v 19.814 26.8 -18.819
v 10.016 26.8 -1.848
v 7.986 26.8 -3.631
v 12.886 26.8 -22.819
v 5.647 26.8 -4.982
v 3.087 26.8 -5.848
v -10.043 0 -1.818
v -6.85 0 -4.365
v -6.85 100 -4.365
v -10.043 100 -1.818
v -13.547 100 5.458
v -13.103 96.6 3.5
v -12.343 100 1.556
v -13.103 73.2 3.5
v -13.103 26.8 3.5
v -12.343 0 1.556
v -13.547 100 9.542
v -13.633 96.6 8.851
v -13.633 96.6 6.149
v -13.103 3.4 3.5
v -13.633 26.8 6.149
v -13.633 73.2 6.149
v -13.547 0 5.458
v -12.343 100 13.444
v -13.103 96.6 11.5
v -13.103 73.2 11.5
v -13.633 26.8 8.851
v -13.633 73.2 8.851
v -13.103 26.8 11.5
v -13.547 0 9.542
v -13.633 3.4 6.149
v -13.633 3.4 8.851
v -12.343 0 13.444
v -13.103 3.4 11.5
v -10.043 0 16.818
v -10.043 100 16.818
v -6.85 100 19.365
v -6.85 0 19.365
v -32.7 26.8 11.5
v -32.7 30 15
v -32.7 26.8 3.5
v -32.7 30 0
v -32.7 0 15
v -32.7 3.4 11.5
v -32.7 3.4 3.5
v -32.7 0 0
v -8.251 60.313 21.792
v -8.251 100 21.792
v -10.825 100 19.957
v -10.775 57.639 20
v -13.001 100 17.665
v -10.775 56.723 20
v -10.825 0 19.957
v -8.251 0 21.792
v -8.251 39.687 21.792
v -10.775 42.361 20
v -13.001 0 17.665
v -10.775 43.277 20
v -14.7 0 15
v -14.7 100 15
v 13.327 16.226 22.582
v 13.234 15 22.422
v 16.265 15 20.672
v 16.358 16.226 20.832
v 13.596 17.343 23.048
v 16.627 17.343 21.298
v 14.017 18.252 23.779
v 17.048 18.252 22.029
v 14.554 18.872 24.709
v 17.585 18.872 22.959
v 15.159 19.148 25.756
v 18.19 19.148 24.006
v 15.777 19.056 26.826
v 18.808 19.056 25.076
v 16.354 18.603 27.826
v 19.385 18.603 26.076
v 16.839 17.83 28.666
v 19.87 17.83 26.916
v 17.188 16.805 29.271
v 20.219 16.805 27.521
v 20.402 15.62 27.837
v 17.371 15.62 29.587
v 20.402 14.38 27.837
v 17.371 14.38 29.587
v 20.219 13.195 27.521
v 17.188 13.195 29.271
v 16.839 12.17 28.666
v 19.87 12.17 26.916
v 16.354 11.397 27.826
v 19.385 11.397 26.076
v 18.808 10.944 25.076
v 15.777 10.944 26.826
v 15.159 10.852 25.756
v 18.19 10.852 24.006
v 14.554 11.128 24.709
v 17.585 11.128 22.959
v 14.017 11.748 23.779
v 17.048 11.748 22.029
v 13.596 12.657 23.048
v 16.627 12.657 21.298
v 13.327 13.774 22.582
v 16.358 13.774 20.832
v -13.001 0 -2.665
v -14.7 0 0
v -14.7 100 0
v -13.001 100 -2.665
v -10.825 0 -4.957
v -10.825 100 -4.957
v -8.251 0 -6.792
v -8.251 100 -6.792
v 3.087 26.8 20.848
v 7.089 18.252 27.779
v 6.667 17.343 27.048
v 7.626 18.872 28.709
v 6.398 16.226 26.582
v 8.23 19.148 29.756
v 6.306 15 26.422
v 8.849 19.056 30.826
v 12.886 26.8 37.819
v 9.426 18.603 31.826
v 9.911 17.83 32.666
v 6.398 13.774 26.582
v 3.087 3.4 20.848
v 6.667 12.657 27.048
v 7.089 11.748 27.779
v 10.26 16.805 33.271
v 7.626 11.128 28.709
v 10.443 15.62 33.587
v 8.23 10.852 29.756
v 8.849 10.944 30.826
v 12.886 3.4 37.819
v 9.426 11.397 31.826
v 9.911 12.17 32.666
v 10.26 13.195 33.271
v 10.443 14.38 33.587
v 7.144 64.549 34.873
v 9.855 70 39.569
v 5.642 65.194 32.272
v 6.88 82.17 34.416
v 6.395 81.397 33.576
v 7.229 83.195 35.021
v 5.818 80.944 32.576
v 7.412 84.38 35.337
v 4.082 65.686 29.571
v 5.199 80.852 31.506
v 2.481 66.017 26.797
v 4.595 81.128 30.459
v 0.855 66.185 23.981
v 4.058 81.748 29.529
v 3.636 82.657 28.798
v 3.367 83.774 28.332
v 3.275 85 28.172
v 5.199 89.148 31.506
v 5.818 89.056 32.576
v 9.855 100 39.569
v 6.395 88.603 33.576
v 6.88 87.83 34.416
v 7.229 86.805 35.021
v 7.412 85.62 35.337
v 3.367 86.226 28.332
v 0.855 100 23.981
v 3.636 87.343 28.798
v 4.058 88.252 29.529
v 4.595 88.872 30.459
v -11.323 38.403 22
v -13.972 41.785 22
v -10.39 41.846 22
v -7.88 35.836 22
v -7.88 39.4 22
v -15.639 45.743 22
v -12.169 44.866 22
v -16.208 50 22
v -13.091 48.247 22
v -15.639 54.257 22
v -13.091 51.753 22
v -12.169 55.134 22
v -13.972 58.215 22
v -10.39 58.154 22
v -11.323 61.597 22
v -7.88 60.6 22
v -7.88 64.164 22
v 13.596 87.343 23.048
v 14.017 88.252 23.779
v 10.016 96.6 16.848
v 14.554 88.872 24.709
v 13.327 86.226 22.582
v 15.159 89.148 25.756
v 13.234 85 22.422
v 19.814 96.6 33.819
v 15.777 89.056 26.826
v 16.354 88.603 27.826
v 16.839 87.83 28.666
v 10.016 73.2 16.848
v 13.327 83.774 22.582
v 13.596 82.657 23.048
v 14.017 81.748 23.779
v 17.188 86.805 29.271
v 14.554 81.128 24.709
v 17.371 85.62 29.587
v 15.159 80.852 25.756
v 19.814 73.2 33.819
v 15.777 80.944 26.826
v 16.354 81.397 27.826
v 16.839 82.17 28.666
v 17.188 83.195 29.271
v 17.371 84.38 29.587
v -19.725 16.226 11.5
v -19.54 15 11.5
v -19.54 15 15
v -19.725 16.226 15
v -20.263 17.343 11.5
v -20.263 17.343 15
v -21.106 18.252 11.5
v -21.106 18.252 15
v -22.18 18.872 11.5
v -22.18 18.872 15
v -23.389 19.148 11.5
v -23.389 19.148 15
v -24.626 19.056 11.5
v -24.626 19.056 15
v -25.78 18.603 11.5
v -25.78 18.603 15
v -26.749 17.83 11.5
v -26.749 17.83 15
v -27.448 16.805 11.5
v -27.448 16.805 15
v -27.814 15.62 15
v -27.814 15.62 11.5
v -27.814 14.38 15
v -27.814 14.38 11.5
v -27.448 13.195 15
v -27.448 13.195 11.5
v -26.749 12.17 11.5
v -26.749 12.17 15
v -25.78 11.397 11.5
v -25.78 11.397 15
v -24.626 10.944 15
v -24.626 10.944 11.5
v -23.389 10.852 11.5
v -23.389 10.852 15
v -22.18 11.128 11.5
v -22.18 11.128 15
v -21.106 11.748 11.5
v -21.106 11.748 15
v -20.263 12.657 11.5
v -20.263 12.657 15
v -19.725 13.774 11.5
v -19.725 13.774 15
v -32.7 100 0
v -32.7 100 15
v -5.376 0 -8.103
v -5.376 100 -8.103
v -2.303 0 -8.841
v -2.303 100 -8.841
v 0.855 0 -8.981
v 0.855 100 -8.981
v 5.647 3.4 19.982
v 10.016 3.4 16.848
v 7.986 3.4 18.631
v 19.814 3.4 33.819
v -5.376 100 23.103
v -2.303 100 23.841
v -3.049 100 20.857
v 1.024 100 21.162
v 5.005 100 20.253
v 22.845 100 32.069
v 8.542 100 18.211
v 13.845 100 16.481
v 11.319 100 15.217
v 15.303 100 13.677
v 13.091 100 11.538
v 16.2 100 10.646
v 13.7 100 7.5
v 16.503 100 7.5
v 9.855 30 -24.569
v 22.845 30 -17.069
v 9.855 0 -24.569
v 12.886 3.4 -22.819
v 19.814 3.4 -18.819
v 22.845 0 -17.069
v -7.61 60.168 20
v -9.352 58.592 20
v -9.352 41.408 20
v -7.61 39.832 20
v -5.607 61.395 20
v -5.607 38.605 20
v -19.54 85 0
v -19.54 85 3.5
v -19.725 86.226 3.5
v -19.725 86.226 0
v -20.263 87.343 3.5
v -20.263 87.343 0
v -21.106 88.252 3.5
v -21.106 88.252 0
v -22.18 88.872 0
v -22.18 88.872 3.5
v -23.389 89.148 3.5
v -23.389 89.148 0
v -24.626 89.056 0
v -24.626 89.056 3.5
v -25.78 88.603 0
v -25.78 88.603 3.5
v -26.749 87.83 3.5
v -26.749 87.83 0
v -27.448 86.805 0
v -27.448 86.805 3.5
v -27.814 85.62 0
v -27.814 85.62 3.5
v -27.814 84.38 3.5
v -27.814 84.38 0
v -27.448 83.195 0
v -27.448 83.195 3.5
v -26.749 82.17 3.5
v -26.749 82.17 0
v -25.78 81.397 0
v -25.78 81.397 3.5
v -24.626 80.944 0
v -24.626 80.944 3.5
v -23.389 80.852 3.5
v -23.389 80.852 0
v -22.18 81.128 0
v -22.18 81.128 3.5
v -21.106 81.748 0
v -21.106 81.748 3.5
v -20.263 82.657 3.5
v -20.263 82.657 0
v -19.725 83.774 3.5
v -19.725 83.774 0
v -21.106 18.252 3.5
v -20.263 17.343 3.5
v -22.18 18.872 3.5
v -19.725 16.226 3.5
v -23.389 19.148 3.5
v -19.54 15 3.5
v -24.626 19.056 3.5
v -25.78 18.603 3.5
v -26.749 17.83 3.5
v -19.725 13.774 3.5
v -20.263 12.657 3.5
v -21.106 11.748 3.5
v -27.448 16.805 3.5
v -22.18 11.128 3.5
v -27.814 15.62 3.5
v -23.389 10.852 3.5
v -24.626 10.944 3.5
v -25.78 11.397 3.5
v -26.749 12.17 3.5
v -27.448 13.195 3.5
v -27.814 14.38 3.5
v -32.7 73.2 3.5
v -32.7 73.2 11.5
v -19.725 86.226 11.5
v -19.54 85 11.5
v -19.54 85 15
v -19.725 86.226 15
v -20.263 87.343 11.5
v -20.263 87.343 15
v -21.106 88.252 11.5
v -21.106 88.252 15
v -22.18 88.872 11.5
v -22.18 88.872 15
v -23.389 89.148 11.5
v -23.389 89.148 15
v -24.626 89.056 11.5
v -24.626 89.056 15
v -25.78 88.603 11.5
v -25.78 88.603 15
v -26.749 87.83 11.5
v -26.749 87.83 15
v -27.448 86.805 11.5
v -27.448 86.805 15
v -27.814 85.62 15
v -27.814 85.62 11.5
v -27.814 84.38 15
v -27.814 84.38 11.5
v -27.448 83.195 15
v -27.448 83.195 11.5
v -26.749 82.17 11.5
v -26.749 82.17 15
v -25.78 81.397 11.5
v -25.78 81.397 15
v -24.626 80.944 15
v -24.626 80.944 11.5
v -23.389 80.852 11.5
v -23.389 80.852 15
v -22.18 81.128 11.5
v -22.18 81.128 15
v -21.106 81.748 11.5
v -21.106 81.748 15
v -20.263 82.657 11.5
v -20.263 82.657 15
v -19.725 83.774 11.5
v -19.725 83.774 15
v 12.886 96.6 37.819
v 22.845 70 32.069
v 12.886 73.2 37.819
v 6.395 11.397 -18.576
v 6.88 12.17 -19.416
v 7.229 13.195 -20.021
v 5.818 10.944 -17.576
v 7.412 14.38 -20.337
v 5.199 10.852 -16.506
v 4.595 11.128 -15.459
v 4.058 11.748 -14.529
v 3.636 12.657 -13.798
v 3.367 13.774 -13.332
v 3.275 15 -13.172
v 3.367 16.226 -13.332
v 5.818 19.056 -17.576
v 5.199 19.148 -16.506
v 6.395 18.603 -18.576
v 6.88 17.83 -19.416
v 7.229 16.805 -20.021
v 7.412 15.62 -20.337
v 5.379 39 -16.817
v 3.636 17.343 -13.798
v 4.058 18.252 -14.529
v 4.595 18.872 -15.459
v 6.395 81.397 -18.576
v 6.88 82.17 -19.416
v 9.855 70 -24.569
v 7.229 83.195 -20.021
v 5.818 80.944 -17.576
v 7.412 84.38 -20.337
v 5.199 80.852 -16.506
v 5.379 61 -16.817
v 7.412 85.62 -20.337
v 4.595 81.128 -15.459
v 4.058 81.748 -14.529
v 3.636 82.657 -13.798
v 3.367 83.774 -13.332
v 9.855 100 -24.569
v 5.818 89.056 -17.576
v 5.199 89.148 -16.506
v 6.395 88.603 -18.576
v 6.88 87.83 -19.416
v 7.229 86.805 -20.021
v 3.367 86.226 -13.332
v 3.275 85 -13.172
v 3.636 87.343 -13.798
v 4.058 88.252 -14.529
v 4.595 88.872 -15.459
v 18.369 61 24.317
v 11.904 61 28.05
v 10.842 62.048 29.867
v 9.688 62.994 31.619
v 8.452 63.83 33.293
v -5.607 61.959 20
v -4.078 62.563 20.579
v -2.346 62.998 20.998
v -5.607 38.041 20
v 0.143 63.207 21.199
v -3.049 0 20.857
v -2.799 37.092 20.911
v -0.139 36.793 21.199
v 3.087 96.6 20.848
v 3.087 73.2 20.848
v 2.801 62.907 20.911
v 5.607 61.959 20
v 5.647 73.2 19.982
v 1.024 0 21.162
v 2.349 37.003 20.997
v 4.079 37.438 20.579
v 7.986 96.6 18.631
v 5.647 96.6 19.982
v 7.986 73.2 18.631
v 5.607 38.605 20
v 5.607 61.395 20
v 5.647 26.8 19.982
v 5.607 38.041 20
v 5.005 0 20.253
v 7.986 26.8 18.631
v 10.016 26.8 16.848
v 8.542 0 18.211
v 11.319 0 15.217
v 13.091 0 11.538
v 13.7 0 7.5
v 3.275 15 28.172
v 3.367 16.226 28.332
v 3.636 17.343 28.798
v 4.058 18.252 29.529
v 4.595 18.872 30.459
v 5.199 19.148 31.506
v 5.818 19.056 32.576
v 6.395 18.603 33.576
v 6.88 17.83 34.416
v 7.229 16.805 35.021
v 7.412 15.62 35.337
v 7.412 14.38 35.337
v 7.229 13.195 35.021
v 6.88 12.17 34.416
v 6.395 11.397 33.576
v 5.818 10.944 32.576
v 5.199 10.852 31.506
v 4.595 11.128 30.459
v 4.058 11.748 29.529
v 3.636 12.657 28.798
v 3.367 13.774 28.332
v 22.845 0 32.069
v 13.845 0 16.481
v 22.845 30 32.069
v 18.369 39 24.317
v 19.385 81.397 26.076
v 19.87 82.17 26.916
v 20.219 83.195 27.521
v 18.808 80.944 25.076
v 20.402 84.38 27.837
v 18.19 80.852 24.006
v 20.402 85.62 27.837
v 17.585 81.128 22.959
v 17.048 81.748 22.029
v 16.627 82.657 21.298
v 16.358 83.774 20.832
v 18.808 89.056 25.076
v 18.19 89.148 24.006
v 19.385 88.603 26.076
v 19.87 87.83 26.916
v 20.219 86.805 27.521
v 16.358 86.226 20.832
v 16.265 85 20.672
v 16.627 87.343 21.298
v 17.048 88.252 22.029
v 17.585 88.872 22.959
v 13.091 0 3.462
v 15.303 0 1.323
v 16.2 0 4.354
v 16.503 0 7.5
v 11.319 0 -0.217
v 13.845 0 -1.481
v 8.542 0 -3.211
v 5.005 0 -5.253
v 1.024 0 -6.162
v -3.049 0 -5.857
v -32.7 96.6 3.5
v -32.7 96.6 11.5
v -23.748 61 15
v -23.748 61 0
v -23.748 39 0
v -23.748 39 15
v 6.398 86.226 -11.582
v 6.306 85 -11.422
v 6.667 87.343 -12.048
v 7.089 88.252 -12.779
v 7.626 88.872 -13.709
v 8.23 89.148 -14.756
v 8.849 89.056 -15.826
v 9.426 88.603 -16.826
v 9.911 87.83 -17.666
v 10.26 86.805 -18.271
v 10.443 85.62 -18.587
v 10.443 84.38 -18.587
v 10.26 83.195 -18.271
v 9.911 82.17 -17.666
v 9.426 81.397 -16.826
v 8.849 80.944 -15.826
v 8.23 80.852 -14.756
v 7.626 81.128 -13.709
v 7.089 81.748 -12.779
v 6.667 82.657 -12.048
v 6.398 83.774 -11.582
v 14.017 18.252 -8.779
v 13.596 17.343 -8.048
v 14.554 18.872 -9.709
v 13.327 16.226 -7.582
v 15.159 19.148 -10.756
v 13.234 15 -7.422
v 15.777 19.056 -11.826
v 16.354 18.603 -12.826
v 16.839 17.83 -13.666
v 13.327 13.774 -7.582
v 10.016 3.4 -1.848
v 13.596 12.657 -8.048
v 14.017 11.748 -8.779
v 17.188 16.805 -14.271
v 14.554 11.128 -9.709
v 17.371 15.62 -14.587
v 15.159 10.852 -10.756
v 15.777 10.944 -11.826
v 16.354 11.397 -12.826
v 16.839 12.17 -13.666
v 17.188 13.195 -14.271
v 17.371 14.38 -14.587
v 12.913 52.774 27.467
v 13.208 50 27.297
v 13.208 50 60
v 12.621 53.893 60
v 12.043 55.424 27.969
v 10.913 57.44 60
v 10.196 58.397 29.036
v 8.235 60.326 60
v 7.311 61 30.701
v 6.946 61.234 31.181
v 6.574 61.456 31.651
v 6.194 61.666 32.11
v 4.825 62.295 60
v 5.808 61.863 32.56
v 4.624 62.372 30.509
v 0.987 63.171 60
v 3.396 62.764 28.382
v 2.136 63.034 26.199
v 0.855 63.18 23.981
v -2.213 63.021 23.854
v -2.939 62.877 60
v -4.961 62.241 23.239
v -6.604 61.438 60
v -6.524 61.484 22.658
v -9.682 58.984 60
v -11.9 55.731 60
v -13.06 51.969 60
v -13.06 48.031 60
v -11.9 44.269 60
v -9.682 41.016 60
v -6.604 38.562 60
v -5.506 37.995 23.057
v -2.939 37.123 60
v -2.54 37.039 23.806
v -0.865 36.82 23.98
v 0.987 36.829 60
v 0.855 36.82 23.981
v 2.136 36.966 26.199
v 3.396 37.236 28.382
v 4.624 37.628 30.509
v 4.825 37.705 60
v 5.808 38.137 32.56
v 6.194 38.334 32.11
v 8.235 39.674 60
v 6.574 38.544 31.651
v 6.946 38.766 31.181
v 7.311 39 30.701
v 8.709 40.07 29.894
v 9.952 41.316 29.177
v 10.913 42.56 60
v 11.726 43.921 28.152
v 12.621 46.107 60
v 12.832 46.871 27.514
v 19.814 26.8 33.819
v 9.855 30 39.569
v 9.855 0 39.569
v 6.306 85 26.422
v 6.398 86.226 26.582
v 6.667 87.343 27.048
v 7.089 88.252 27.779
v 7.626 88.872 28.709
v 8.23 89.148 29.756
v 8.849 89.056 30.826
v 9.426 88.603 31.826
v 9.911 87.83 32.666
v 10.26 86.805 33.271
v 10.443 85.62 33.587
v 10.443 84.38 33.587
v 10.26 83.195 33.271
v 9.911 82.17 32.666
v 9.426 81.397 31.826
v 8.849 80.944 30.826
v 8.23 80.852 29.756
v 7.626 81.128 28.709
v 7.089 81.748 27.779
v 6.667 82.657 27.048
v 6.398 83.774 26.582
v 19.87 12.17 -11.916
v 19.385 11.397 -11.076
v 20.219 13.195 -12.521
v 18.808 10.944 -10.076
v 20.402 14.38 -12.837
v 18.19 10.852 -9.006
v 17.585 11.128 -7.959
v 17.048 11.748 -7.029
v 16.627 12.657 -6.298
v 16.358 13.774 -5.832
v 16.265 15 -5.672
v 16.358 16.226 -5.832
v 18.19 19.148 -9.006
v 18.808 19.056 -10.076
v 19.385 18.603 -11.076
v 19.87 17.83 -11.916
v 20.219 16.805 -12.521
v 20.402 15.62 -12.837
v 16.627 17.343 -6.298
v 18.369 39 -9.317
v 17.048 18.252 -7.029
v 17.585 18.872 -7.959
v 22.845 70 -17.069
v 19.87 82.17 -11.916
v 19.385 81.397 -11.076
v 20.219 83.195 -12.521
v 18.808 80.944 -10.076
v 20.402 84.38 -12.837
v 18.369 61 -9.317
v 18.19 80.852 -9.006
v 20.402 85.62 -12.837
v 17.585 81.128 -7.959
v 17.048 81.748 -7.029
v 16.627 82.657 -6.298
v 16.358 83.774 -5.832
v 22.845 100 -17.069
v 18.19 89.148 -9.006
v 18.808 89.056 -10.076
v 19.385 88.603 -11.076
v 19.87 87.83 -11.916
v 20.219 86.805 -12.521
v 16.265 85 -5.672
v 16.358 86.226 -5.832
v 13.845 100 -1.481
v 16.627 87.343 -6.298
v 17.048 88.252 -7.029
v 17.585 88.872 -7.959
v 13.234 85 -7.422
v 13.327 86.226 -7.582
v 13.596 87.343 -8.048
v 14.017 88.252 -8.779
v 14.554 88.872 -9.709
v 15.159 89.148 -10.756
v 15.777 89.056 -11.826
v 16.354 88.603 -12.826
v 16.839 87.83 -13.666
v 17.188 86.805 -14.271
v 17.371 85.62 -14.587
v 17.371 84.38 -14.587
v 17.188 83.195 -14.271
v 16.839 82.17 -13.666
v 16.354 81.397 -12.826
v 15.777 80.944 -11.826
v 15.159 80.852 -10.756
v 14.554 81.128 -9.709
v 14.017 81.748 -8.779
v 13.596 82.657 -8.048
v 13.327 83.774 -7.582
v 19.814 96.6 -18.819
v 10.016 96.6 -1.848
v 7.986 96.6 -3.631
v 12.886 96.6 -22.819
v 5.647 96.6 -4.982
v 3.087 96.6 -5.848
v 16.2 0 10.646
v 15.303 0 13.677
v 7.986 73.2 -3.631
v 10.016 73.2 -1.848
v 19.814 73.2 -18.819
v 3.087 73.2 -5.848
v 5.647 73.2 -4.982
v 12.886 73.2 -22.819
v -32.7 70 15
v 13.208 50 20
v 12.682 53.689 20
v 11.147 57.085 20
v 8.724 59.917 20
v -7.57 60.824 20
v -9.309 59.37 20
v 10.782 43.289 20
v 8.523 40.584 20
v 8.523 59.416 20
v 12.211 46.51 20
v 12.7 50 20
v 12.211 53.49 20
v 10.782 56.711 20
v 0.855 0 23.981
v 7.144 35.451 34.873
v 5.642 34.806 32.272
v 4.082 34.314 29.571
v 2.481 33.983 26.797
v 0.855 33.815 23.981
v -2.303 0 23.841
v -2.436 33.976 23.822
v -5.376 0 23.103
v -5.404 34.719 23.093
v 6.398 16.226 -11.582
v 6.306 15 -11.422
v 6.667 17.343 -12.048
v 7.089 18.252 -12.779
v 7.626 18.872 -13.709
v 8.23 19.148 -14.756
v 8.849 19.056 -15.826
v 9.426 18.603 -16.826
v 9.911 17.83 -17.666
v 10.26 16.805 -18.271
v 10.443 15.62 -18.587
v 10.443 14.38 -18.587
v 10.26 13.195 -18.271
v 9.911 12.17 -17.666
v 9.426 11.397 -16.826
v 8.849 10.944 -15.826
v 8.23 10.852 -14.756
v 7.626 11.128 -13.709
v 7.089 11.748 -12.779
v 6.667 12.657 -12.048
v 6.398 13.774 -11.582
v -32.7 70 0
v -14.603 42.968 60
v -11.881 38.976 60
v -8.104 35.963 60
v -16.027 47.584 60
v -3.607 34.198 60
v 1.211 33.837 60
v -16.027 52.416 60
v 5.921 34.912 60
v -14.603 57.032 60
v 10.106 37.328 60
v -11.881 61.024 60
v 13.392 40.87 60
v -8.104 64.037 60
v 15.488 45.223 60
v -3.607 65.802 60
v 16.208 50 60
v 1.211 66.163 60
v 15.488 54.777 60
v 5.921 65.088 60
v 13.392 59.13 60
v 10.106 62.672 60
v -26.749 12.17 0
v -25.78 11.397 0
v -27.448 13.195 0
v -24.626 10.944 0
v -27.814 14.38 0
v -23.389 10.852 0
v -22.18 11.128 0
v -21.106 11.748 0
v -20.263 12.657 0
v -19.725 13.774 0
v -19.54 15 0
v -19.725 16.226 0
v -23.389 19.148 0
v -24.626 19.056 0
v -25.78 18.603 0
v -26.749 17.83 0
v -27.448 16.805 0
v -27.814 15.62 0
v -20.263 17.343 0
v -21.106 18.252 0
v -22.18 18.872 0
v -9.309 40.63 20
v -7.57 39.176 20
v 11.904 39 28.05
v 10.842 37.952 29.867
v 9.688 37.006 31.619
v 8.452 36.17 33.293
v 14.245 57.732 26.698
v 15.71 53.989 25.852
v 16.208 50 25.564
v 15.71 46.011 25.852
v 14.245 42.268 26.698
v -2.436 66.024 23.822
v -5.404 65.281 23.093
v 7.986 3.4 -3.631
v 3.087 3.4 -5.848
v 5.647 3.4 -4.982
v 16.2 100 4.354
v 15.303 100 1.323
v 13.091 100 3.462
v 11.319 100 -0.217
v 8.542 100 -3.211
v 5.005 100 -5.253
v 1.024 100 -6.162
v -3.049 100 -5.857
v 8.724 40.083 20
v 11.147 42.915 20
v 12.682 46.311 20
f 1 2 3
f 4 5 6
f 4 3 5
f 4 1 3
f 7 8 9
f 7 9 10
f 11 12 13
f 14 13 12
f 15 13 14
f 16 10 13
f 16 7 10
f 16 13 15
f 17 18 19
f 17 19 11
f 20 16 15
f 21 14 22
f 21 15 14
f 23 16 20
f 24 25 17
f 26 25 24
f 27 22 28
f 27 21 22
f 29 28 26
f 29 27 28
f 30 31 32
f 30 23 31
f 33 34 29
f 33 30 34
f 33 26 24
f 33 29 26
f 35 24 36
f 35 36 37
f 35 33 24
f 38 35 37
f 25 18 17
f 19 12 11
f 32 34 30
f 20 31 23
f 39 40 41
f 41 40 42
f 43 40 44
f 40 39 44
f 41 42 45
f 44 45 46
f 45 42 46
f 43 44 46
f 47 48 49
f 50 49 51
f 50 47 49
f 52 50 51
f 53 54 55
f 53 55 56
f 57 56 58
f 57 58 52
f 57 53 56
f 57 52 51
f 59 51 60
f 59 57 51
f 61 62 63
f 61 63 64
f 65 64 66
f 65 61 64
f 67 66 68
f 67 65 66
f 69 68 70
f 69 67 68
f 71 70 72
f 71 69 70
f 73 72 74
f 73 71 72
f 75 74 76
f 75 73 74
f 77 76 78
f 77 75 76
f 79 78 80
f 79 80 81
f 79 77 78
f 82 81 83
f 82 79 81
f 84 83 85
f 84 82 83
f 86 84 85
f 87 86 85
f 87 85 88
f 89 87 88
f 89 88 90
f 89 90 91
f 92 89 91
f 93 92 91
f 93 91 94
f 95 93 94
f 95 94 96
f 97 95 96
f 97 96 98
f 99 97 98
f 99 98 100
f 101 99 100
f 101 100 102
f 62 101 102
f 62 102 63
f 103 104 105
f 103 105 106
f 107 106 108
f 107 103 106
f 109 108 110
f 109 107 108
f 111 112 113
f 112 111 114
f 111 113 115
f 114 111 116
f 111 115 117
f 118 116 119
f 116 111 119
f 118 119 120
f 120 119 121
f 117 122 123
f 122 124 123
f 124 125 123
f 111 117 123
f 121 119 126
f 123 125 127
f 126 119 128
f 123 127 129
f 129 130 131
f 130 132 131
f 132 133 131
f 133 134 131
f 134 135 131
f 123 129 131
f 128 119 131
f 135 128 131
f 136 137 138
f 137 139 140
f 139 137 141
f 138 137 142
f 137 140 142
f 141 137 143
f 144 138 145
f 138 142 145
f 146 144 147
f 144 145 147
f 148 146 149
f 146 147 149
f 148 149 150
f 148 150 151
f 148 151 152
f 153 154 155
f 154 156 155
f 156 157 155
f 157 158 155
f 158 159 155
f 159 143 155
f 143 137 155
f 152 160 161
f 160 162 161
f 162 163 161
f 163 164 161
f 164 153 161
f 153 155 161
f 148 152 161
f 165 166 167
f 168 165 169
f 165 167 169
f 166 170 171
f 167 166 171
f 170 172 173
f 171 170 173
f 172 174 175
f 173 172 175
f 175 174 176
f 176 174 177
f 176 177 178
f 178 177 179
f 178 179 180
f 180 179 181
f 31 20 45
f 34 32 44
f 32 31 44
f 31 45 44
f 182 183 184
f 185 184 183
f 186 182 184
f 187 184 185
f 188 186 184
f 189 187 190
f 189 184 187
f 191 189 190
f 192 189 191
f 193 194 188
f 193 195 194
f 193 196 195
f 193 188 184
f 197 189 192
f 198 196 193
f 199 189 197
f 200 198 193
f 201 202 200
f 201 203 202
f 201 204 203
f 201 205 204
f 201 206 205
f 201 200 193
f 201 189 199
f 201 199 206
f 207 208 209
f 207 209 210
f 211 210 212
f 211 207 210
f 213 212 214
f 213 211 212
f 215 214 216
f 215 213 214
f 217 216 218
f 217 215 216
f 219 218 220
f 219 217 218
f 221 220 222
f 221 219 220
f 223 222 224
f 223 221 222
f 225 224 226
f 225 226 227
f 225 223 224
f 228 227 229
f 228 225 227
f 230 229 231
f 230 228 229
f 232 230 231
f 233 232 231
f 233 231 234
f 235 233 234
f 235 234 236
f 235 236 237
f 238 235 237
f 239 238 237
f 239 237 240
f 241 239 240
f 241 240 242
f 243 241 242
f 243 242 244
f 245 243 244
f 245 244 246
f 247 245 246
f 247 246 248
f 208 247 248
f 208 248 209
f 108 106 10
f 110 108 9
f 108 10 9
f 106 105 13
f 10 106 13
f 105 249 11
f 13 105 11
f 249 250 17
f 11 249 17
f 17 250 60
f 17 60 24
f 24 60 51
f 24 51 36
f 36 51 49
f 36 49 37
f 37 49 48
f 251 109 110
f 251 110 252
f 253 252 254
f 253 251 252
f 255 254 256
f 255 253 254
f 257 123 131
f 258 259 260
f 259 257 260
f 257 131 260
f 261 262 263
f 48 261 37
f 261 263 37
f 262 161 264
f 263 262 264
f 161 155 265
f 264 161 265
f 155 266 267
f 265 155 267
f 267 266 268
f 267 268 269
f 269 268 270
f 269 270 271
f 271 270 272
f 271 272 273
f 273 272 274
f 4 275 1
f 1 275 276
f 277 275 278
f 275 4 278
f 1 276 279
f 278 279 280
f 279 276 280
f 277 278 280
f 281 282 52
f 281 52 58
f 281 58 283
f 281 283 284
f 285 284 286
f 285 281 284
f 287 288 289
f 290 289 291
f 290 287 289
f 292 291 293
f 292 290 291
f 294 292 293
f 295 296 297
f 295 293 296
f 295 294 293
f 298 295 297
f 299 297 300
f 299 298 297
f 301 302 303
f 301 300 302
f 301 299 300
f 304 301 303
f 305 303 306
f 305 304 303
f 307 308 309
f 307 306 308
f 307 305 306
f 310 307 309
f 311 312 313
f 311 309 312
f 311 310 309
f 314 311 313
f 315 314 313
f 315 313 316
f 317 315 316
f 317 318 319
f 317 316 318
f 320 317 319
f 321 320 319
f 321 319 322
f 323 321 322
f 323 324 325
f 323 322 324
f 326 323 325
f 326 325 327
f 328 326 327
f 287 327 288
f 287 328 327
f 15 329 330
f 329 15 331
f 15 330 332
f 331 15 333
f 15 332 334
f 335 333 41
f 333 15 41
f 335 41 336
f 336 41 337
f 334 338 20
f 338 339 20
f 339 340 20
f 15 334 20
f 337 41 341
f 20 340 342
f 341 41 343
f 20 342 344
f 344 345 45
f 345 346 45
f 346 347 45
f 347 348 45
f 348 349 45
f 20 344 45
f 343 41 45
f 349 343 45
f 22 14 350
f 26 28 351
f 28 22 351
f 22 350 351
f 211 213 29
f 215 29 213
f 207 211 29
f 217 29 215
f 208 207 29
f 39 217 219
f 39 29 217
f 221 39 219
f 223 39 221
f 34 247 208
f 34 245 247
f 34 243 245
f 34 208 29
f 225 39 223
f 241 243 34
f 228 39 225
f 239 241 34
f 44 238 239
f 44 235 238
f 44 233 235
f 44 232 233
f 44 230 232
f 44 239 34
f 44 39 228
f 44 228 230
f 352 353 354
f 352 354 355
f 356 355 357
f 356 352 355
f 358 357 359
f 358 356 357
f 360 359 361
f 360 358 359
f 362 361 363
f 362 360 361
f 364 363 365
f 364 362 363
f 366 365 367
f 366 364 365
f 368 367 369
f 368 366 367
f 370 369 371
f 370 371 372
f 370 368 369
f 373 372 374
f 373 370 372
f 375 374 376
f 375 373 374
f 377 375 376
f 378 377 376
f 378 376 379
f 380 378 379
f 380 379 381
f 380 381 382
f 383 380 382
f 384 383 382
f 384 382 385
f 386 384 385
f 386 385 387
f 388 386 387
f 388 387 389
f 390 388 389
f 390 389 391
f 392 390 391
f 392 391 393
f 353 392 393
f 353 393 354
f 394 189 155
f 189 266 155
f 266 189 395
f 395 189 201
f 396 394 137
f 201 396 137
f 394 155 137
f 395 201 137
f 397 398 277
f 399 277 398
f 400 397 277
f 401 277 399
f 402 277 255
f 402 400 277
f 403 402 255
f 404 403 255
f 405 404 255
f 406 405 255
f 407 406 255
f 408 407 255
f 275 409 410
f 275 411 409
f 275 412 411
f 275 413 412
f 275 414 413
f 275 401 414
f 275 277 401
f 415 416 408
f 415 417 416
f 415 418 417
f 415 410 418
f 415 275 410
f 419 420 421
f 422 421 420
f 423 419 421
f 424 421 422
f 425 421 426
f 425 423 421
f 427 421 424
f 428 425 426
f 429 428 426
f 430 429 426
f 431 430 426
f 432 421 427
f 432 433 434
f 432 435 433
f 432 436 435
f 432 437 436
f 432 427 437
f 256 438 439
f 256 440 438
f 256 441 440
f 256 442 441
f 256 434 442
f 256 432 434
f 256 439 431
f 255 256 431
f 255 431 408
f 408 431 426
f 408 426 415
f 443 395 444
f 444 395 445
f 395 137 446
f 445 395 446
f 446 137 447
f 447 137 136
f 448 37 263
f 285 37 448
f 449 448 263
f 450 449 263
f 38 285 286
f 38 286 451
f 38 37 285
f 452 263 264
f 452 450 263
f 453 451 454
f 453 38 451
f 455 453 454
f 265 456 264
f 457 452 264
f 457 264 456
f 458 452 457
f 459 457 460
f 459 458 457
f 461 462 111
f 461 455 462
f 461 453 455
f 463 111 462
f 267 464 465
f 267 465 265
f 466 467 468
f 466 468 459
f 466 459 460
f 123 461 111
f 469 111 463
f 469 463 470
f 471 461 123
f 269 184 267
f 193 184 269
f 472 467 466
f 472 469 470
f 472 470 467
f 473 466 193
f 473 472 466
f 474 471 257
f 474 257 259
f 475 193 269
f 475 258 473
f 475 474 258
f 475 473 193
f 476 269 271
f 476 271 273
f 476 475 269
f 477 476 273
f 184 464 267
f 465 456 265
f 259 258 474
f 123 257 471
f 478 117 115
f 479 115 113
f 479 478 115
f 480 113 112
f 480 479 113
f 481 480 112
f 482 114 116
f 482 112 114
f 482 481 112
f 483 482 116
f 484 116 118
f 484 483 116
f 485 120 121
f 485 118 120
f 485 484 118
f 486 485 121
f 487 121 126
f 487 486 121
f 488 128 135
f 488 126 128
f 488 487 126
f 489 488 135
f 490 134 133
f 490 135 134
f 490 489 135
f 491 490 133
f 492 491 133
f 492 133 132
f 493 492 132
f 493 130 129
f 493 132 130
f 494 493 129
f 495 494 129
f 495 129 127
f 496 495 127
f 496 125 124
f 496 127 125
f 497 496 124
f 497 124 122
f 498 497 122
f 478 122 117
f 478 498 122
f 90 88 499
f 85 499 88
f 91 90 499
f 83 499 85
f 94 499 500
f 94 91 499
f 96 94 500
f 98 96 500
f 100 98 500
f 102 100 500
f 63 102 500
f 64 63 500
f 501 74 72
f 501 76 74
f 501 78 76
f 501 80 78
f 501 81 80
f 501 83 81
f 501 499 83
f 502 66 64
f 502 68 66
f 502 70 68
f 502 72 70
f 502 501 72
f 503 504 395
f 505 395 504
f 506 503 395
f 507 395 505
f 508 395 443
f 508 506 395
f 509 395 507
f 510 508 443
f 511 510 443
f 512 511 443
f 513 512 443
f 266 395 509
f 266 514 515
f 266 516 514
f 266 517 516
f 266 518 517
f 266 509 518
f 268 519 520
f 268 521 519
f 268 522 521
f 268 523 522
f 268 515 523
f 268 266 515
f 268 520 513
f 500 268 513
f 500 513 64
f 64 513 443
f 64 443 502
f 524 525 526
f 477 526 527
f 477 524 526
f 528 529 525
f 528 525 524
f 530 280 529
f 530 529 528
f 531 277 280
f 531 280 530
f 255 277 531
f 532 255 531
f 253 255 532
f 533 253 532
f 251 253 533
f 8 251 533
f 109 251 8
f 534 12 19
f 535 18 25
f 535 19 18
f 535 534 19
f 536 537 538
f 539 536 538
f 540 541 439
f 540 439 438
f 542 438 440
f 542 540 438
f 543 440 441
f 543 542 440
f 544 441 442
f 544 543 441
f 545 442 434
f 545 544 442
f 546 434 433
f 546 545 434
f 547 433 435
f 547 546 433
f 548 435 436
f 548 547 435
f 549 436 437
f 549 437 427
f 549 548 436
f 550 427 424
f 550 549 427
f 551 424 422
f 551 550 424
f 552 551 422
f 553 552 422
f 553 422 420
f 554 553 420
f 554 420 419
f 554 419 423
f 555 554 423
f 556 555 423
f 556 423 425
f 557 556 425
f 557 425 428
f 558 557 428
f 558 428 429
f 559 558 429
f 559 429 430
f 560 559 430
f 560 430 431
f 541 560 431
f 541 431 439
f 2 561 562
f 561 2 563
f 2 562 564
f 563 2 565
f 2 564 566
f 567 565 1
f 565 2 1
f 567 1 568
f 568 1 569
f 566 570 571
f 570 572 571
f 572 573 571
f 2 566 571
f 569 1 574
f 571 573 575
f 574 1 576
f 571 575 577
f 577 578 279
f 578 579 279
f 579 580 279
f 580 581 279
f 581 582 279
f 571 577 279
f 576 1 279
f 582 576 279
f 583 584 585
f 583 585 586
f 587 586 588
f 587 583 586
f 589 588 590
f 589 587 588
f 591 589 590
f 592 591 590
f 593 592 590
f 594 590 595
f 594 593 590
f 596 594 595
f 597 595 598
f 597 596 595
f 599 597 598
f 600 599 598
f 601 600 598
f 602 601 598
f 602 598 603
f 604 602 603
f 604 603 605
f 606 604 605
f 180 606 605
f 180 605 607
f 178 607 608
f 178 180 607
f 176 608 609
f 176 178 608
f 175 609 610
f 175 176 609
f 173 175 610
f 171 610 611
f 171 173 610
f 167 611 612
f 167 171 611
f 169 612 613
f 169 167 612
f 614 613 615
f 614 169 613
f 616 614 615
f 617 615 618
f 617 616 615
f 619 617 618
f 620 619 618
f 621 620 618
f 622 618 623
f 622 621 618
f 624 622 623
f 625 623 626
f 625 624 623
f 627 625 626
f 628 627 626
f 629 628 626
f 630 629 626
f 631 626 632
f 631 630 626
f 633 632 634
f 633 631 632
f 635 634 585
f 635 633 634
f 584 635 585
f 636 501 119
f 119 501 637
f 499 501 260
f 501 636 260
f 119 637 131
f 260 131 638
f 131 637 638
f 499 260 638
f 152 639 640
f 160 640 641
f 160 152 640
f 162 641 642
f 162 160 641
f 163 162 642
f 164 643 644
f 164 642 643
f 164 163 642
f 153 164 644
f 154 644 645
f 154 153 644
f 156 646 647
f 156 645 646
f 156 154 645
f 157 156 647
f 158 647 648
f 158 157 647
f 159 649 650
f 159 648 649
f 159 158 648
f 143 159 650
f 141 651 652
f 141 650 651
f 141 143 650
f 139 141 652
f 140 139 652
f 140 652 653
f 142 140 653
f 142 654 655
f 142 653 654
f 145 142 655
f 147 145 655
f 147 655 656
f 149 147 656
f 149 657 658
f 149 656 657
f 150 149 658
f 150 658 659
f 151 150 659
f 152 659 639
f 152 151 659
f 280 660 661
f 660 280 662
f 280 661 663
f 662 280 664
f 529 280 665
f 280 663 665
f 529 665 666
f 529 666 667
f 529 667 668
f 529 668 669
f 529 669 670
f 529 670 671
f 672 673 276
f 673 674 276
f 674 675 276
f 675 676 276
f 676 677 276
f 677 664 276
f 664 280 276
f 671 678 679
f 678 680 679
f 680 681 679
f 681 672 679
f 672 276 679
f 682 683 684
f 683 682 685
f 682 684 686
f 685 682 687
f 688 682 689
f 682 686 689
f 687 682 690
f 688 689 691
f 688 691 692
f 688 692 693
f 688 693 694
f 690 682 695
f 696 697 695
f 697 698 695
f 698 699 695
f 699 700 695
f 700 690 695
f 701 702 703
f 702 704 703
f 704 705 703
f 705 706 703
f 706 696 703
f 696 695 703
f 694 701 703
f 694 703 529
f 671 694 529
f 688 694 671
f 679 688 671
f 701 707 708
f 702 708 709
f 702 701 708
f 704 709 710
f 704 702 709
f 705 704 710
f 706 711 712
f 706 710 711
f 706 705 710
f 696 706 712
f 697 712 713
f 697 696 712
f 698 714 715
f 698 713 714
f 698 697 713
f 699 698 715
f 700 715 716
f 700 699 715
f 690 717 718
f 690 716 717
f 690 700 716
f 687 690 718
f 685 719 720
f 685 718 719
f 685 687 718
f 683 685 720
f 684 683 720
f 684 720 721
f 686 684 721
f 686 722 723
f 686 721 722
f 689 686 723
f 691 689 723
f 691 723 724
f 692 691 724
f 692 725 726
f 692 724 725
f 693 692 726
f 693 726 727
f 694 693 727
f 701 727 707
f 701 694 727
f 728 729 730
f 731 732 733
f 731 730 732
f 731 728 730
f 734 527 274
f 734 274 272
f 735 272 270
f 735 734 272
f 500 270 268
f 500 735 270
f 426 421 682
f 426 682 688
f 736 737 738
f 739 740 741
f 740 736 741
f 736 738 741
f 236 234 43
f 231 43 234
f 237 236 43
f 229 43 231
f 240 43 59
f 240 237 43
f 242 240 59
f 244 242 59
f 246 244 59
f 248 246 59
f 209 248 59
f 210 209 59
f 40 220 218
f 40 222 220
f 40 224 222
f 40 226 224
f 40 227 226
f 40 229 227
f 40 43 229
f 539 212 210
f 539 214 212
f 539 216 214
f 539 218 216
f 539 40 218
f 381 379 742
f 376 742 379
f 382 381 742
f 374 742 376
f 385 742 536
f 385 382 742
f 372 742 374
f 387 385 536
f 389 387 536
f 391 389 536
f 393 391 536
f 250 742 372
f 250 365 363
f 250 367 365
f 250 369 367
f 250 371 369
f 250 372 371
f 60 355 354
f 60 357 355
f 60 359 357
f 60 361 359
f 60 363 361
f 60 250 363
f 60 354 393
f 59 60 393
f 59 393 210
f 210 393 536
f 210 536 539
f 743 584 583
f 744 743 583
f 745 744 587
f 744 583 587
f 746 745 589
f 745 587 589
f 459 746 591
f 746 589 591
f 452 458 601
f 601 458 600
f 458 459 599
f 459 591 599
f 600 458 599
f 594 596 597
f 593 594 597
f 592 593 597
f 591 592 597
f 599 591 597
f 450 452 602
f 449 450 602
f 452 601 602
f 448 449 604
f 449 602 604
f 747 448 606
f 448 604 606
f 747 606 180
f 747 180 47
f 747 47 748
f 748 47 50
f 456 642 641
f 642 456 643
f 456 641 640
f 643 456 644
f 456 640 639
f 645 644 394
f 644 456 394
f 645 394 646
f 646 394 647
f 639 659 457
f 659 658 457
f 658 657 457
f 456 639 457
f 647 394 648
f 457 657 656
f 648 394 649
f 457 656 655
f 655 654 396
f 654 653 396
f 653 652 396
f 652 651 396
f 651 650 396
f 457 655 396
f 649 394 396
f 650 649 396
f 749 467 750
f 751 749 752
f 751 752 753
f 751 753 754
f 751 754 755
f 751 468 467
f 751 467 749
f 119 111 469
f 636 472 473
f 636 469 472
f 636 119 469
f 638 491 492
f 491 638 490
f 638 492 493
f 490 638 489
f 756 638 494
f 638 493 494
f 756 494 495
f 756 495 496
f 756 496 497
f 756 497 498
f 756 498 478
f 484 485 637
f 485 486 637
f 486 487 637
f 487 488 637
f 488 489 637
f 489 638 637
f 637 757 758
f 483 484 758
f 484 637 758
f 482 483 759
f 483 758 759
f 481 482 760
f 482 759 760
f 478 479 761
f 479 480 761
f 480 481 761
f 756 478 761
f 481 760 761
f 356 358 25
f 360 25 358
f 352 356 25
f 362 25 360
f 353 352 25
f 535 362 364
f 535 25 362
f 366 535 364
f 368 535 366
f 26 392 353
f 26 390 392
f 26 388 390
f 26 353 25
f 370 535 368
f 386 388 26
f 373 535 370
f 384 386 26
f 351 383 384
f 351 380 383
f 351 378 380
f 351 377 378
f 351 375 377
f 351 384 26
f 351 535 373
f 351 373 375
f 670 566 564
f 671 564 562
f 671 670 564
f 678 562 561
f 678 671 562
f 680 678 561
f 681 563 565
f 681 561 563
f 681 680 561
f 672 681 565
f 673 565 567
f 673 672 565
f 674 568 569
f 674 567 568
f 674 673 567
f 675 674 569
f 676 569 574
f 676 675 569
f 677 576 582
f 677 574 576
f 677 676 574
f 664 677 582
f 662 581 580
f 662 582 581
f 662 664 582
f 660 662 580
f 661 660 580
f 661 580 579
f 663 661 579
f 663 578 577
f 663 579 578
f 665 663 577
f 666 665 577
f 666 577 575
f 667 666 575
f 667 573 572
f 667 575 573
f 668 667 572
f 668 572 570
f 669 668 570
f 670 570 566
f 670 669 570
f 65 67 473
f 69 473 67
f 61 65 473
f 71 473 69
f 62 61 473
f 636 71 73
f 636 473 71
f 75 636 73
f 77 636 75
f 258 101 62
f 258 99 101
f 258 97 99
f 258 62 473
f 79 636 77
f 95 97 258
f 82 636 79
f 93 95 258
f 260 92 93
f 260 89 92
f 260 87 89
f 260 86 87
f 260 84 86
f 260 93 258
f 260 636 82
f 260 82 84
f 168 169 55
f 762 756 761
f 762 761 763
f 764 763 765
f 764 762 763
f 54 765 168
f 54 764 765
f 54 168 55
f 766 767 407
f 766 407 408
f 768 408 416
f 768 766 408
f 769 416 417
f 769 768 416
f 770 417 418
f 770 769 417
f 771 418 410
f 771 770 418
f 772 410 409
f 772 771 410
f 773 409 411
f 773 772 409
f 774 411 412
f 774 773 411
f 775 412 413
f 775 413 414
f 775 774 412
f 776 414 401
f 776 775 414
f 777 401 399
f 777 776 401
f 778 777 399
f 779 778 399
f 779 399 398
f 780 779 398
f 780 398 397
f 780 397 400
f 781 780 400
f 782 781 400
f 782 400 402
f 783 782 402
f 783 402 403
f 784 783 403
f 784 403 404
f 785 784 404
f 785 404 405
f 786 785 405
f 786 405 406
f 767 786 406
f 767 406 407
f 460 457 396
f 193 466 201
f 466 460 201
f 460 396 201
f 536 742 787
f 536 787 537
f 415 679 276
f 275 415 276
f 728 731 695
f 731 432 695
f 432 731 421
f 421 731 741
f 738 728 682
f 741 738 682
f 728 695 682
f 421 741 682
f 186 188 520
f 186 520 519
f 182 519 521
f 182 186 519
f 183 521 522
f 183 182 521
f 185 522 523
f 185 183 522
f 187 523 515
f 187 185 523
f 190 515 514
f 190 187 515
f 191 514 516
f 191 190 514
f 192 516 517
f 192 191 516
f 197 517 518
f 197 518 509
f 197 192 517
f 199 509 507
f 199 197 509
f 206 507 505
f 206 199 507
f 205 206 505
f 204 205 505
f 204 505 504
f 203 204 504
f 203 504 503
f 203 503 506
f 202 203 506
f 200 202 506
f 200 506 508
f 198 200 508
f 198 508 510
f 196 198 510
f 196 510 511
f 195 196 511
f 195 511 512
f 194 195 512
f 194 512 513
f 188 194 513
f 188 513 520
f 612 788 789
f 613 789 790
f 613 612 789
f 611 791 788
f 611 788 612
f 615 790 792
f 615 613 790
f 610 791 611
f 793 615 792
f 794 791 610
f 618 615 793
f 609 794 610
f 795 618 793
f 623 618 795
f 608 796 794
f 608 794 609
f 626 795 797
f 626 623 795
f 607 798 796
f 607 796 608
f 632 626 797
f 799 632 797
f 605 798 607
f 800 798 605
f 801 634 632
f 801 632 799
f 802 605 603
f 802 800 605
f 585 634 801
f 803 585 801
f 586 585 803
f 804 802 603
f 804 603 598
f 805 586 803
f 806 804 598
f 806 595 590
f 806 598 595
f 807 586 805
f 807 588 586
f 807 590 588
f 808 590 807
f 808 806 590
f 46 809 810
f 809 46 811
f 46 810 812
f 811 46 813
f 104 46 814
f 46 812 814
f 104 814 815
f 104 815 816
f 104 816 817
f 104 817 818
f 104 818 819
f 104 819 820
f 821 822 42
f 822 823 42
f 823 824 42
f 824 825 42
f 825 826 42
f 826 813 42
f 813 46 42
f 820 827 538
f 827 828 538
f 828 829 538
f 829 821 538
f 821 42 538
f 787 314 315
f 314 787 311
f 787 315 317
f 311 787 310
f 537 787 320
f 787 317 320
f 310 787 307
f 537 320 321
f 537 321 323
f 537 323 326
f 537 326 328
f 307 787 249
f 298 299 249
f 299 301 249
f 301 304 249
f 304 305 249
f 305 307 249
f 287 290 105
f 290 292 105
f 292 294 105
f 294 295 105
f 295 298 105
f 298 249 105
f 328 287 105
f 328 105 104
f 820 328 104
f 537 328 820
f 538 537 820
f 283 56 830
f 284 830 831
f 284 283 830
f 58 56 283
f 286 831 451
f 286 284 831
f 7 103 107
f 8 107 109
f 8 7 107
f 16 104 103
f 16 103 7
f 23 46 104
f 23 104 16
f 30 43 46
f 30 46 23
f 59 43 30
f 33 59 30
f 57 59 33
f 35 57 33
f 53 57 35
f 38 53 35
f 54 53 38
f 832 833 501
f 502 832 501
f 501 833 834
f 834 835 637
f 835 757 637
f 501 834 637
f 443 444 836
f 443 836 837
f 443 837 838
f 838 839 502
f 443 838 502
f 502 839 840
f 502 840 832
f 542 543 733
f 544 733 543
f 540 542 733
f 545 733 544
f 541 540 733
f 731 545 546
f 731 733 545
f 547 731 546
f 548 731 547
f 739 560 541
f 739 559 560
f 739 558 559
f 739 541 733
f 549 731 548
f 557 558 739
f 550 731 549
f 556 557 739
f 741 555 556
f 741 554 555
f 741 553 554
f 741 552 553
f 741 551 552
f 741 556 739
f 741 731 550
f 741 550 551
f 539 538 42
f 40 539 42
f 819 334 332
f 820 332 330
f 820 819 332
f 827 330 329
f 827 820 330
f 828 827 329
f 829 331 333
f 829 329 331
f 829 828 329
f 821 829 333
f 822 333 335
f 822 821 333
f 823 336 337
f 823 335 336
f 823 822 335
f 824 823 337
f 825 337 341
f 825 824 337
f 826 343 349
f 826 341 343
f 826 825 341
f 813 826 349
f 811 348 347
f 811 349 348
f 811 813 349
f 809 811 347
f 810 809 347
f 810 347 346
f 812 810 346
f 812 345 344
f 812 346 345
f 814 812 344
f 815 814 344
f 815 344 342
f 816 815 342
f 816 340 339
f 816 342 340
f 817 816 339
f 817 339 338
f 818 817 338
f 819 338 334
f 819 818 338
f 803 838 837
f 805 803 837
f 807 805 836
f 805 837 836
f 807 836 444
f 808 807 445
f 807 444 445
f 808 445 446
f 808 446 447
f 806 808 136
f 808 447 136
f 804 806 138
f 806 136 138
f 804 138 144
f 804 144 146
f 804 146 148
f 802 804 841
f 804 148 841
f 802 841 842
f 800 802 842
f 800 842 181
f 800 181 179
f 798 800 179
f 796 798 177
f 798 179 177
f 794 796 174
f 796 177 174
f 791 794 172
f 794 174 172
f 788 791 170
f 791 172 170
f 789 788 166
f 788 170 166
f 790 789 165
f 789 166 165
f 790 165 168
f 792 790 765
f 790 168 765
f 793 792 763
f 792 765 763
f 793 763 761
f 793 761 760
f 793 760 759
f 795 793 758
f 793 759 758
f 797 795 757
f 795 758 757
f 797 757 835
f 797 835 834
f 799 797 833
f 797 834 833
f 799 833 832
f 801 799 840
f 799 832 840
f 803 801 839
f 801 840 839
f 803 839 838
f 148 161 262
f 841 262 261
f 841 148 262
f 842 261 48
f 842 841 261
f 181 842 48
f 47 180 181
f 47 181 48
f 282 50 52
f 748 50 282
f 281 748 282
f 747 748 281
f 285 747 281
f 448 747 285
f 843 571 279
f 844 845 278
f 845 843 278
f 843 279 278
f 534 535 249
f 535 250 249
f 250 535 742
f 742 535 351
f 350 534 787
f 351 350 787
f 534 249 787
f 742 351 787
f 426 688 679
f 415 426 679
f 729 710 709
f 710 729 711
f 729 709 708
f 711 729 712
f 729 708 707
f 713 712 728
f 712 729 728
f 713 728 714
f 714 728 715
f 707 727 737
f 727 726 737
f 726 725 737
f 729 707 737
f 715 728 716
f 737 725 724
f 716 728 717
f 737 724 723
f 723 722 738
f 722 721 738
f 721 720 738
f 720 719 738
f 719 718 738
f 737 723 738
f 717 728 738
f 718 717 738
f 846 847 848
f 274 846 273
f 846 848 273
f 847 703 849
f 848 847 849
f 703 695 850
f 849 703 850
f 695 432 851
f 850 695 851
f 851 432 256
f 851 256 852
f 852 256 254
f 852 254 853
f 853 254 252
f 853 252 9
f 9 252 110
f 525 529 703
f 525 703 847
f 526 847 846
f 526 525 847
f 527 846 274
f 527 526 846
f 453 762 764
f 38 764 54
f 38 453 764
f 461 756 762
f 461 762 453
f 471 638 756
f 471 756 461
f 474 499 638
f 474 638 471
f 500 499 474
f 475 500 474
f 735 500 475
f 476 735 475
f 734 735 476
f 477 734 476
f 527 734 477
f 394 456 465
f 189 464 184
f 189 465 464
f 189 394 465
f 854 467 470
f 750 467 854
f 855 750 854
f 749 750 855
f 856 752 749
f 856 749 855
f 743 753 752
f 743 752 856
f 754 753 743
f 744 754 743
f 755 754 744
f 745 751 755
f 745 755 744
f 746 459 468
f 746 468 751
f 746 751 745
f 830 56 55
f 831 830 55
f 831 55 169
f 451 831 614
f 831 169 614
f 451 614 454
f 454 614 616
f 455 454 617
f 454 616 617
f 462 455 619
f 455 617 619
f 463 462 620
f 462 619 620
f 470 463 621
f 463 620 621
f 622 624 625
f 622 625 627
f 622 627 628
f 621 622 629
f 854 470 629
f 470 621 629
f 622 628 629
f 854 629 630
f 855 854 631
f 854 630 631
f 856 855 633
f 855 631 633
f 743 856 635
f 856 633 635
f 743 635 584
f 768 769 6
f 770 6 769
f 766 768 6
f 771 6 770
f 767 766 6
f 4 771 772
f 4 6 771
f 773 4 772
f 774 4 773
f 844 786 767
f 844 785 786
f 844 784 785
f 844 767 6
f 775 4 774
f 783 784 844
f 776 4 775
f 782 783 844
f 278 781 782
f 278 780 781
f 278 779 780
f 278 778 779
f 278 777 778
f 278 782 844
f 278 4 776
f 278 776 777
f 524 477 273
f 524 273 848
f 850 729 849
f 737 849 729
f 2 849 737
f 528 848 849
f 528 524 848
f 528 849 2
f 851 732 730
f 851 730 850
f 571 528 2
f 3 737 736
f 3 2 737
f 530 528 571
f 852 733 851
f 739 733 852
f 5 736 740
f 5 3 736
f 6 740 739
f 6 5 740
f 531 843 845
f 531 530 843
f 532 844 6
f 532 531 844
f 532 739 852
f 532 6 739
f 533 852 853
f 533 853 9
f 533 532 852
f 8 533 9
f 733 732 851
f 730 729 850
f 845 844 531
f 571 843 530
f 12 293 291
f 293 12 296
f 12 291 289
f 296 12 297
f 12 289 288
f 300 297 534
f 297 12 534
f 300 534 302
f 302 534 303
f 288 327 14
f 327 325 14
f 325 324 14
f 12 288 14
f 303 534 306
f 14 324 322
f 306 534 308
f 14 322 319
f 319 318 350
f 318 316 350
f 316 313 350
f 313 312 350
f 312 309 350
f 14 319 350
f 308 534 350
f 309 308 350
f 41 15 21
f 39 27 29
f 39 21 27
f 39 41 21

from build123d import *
from build123d import SkipClean  # not in build123d's __all__

# Parameters (mm, degrees)
F0_R      = 4.16
F1_DEPTH  = 15
F3_DEPTH  = 100
F4_W      = 23.4
F4_H      = 8
F5_DEPTH  = 25
F7_COUNT  = 3
F9_START  = 22
F8_R      = 16.208
F8_R_2    = 13.208
F9_DEPTH  = 38
F10_R     = 12.7
F11_DEPTH = 40
F12_R     = 13.208
F13_DEPTH = 40


# Not quite as in the source:
# - a feature names something its author has since deleted; it is built from what else it names


with BuildPart() as f1:
    # F0 (on Top) → F1 (new body)
    with BuildSketch(Plane.XY):
        Polygon((-32.7, 0), (-14.7, 0), (-14.7, 50), (-14.7, 100), (-32.7, 100), (-32.7, 70), (-23.7483102828, 61), (-23.7483102828, 50), (-23.7483102828, 39), (-32.7, 30), align=None)
        with Locations((-23.7, 15)):
            Circle(F0_R, mode=Mode.SUBTRACT)
        with Locations((-23.7, 85)):
            Circle(F0_R, mode=Mode.SUBTRACT)
    extrude(amount=F1_DEPTH)

    # F2 (on face) → F3 (join)
    with BuildSketch(Plane.XZ):
        with BuildLine():
            Line((-14.7, 0), (-14.7, 15))
            ThreePointArc((-14.7, 15), (-16.5027270474, 7.5), (-14.7, 0))
        make_face()
        with BuildLine():
            ThreePointArc((-6.85, -4.3645480318), (-13.7, 7.5), (-6.85, 19.3645480318))
            Line((-6.85, 19.3645480318), (-8.2513635237, 21.7917808547))
            ThreePointArc((-8.2513635237, 21.7917808547), (-11.9675955686, 18.8629510386), (-14.7, 15))
            Line((-14.7, 15), (-14.7, 0))
            ThreePointArc((-14.7, 0), (-11.9675955686, -3.8629510386), (-8.2513635237, -6.7917808547))
            Line((-8.2513635237, -6.7917808547), (-6.85, -4.3645480318))
        make_face()
    extrude(amount=-F3_DEPTH)

    # F4 (on face) → F5 (cut)
    with BuildSketch(Plane(origin=(-32.7, 0, 0), x_dir=(0, -1, 0), z_dir=(-1, 0, 0))):
        with Locations((-84.9, 7.5)):
            Rectangle(F4_W, F4_H)
        with Locations((-15.1, 7.5)):
            Rectangle(F4_W, F4_H)
    extrude(amount=-F5_DEPTH, mode=Mode.SUBTRACT)

    # F7: F1 ×3 about axis
    f7_axis = Axis((0, 0, 7.5), (0, -1, 0))


with BuildPart() as f1_1:
    add(f1.part, clean=False)
    with SkipClean():  # cleaning this boolean's faces spoils the solid; the shape is the same uncleaned
        for i in range(1, F7_COUNT):
            add(f1.part.rotate(f7_axis, i * 360 / F7_COUNT), clean=False)

    # F8 (on Top) → F9 (join)
    with BuildSketch(Plane.XY.offset(F9_START)):
        with Locations((0, 50)):
            Circle(F8_R)
        with Locations((0, 50)):
            Circle(F8_R_2, mode=Mode.SUBTRACT)
    with SkipClean():  # cleaning this boolean's faces spoils the solid; the shape is the same uncleaned
        extrude(amount=F9_DEPTH)

    # F10 (on face) → F11 (cut)
    with BuildSketch(Plane.XY.offset(60)):
        with Locations((0, 50)):
            Circle(F10_R)
    with SkipClean():  # cleaning this boolean's faces spoils the solid; the shape is the same uncleaned
        extrude(amount=-F11_DEPTH, mode=Mode.SUBTRACT)

    # F12 (on face) → F13 (cut)
    with BuildSketch(Plane.XY.offset(60)):
        with Locations((0, 50)):
            Circle(F12_R)
    with SkipClean():  # cleaning this boolean's faces spoils the solid; the shape is the same uncleaned
        extrude(amount=-F13_DEPTH, mode=Mode.SUBTRACT)


solid = f1_1.part
